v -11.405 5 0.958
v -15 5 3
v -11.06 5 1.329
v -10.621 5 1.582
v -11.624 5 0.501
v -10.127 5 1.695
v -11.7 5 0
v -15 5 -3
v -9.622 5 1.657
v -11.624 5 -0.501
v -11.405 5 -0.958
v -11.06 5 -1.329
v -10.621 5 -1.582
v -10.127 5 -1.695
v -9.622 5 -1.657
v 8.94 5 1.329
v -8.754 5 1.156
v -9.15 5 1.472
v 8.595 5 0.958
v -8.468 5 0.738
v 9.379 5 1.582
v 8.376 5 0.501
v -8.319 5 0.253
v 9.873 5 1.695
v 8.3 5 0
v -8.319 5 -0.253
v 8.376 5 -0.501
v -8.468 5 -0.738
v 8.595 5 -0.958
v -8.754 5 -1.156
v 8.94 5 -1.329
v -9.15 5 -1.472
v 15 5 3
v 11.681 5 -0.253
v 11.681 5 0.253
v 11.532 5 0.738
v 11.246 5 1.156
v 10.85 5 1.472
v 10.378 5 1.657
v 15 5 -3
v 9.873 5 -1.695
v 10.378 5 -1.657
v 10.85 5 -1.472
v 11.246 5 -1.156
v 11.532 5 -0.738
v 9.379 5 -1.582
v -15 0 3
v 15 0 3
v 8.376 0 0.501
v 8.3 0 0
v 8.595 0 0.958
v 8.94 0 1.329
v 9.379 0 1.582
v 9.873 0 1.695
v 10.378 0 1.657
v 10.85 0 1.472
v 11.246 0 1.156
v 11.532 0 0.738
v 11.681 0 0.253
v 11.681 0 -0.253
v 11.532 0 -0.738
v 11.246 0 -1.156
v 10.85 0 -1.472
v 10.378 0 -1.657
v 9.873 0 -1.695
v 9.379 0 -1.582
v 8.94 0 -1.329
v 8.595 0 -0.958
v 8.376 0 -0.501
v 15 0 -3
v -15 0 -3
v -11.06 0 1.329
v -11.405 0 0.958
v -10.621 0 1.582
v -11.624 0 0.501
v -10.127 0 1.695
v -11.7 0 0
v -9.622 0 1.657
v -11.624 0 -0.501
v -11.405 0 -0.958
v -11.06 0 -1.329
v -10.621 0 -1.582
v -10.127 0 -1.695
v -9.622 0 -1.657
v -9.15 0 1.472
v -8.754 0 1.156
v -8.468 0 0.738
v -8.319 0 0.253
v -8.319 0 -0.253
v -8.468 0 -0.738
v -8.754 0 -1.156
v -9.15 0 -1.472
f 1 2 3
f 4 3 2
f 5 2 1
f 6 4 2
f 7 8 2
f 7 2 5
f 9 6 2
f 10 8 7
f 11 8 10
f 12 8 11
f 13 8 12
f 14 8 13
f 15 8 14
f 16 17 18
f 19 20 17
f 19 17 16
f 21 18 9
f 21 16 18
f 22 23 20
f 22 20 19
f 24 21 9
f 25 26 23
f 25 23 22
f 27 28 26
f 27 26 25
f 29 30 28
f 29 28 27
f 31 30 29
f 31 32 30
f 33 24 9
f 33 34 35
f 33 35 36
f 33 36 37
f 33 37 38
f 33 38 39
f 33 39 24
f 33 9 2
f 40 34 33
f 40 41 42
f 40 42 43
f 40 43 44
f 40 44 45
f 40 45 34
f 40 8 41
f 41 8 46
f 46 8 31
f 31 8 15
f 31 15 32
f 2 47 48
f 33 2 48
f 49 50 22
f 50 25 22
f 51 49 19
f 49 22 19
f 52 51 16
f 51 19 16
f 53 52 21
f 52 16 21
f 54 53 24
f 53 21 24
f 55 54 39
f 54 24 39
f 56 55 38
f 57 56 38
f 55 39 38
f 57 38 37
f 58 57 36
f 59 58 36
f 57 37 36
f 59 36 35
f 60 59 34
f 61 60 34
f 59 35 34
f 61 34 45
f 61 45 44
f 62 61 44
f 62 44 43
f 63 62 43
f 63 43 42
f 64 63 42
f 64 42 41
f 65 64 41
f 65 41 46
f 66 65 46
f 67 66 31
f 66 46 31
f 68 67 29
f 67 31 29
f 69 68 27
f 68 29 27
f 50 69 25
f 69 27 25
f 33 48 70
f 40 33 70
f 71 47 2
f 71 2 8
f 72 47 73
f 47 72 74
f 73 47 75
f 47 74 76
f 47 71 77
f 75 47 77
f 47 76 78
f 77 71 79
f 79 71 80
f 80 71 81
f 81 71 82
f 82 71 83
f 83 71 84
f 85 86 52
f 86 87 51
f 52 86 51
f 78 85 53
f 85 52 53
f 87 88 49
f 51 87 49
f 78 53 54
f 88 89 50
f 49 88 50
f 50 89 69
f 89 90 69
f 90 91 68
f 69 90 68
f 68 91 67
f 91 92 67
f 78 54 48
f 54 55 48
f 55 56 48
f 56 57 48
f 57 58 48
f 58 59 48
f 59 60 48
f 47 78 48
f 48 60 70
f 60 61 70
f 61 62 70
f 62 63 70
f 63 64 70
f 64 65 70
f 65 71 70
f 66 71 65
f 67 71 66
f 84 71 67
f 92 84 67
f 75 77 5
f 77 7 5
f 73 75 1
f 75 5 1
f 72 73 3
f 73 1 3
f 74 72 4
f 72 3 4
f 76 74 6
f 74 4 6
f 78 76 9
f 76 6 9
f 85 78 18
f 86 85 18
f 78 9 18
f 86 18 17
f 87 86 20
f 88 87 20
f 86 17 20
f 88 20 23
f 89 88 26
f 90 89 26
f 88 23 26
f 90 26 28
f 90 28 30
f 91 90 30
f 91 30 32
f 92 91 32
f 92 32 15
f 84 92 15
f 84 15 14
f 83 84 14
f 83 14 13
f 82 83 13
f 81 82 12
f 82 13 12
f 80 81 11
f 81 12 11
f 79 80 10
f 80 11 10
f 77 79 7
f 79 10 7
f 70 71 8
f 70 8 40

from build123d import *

# Parameters (mm, degrees)
ESQUISSE1_W          = 30
ESQUISSE1_H          = 6
BOSS_EXTRU_1_DEPTH   = 5
D_GAGEMENT_M31_D     = 3.4
D_GAGEMENT_M31_DEPTH = 5
D_GAGEMENT_M31_TIP   = 1.021463052


with BuildPart() as part:
    # Esquisse1 → Boss.-Extru.1 (new body)
    with BuildSketch(Plane(origin=(0, 0, 0), x_dir=(1, 0, 0), z_dir=(0, 1, 0))):
        Rectangle(ESQUISSE1_W, ESQUISSE1_H)
    extrude(amount=BOSS_EXTRU_1_DEPTH)

    # Dégagement M31
    with Locations(Plane.XZ):
        with Locations((10, 0), (-10, 0)):
            Hole(D_GAGEMENT_M31_D / 2, depth=D_GAGEMENT_M31_DEPTH)
            with Locations((0, 0, -(D_GAGEMENT_M31_DEPTH + D_GAGEMENT_M31_TIP / 2))):  # 118° drill point
                Cone(0, D_GAGEMENT_M31_D / 2, D_GAGEMENT_M31_TIP, mode=Mode.SUBTRACT)


solid = part.part
